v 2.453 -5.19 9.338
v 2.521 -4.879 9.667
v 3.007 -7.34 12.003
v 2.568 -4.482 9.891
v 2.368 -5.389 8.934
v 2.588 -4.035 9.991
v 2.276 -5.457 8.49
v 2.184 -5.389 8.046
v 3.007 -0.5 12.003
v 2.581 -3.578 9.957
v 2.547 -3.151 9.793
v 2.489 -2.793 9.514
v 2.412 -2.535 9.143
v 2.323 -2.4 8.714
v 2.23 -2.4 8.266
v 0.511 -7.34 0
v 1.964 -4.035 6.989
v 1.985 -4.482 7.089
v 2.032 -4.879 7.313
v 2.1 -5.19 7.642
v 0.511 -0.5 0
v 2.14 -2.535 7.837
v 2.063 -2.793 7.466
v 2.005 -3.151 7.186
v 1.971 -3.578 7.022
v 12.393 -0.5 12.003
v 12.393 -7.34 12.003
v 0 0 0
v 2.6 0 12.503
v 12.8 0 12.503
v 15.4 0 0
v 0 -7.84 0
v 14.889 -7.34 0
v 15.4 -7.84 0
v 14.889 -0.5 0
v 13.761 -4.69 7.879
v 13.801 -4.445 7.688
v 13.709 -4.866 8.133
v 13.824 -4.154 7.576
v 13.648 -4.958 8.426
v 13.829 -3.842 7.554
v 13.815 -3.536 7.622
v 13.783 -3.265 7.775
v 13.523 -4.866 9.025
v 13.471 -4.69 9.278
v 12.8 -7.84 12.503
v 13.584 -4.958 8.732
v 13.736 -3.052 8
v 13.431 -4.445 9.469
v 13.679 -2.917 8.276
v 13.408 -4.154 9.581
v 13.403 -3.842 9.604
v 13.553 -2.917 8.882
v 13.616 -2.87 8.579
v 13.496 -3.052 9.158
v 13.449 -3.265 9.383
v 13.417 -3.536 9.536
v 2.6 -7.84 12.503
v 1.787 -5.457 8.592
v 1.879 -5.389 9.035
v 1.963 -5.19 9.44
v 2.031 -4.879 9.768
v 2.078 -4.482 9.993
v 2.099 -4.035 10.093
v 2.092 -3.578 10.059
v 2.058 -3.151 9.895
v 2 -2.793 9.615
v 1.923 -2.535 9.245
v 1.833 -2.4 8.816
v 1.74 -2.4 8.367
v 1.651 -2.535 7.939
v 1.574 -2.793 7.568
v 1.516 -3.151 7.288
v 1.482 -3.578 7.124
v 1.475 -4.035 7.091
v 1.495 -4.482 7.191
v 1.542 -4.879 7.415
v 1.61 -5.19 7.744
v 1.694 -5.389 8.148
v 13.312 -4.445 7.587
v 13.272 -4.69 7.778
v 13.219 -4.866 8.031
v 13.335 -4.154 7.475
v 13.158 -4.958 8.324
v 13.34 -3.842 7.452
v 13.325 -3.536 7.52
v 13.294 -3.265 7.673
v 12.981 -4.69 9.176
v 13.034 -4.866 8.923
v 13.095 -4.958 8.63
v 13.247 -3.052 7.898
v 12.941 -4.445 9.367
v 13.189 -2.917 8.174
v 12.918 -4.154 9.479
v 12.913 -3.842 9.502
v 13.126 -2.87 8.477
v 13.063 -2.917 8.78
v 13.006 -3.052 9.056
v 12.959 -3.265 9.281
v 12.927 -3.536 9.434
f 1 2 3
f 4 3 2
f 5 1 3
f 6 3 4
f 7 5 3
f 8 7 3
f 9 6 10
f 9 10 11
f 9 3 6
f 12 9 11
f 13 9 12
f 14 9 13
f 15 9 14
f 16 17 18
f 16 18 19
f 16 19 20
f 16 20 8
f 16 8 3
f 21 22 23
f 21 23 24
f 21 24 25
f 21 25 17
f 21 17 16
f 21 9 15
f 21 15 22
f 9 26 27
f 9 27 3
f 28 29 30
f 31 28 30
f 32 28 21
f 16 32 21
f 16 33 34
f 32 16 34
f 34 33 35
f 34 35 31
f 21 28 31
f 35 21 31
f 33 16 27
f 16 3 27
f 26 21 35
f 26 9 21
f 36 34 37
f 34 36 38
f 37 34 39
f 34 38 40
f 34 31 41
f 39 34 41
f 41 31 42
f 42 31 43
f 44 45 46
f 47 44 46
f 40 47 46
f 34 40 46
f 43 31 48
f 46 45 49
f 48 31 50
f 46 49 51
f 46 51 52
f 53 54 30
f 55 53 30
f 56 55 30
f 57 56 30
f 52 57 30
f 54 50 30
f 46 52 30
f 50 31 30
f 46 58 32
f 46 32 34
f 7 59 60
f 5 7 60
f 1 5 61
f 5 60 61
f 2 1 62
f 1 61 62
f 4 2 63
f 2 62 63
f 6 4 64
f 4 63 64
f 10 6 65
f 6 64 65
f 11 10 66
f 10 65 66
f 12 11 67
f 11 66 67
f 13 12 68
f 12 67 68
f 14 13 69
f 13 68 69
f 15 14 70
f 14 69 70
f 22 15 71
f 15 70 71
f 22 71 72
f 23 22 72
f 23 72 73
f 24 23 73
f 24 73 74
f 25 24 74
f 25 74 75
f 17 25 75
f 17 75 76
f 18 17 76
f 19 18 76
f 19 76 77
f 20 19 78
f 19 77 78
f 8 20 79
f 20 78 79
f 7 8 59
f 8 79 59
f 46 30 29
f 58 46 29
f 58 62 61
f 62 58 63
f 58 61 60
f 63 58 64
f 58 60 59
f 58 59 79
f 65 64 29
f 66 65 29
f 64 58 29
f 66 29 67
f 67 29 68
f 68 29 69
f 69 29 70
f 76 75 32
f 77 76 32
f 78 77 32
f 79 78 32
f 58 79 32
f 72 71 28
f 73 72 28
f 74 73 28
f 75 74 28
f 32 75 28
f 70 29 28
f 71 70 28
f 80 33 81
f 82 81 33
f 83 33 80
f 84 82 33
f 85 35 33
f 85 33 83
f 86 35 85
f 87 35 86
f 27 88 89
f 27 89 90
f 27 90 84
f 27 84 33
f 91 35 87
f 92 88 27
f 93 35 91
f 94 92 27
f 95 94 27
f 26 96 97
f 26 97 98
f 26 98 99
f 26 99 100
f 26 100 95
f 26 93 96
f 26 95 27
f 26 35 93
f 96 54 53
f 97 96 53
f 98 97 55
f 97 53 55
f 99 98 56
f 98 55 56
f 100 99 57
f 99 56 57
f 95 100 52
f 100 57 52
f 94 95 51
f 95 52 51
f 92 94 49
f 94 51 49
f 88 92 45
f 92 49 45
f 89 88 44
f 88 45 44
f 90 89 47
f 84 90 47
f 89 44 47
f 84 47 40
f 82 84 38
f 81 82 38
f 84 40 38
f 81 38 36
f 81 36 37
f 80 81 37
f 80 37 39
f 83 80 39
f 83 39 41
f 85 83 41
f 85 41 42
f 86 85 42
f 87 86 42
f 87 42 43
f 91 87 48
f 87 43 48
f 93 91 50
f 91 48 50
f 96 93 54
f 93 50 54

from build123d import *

# Parameters (mm, degrees)
F1_DEPTH = 7.84
F3_T     = -0.5
F2_R     = 1.0501143569
F4_DEPTH = 0.5
F5_R     = 1.5374067345
F6_DEPTH = 0.5


with BuildPart() as f1:
    # F0 (on Front) → F1 (new body)
    with BuildSketch(Plane.XZ):
        Polygon((2.6, 12.5025157468), (0, 0), (15.4, 0), (12.8, 12.5025157468), align=None)
    extrude(amount=F1_DEPTH)

    # F3
    f3_openings = [f1.faces().sort_by_distance(p)[0] for p in [
        (7.7, -3.92, 0),
    ]]
    offset(amount=F3_T, openings=f3_openings)

    # F2 (on face) → F4 (cut, through all)
    with BuildSketch(Plane(origin=(14.7616106661, 0, 3.069797192), x_dir=(0, 1, 0), z_dir=(0.9790536998, 0, 0.2036021926))):
        with Locations((-3.92, 5.6268600747)):
            Circle(F2_R)
    extrude(amount=-F4_DEPTH, mode=Mode.SUBTRACT)

    # F5 (on face) → F6 (cut, through all)
    with BuildSketch(Plane(origin=(0, 0, 0), x_dir=(0, -1, 0), z_dir=(-0.9790536998, 0, 0.2036021926))):
        with Locations((3.92, 8.7754800916)):
            Circle(F5_R)
    extrude(amount=-F6_DEPTH, mode=Mode.SUBTRACT)


solid = f1.part
